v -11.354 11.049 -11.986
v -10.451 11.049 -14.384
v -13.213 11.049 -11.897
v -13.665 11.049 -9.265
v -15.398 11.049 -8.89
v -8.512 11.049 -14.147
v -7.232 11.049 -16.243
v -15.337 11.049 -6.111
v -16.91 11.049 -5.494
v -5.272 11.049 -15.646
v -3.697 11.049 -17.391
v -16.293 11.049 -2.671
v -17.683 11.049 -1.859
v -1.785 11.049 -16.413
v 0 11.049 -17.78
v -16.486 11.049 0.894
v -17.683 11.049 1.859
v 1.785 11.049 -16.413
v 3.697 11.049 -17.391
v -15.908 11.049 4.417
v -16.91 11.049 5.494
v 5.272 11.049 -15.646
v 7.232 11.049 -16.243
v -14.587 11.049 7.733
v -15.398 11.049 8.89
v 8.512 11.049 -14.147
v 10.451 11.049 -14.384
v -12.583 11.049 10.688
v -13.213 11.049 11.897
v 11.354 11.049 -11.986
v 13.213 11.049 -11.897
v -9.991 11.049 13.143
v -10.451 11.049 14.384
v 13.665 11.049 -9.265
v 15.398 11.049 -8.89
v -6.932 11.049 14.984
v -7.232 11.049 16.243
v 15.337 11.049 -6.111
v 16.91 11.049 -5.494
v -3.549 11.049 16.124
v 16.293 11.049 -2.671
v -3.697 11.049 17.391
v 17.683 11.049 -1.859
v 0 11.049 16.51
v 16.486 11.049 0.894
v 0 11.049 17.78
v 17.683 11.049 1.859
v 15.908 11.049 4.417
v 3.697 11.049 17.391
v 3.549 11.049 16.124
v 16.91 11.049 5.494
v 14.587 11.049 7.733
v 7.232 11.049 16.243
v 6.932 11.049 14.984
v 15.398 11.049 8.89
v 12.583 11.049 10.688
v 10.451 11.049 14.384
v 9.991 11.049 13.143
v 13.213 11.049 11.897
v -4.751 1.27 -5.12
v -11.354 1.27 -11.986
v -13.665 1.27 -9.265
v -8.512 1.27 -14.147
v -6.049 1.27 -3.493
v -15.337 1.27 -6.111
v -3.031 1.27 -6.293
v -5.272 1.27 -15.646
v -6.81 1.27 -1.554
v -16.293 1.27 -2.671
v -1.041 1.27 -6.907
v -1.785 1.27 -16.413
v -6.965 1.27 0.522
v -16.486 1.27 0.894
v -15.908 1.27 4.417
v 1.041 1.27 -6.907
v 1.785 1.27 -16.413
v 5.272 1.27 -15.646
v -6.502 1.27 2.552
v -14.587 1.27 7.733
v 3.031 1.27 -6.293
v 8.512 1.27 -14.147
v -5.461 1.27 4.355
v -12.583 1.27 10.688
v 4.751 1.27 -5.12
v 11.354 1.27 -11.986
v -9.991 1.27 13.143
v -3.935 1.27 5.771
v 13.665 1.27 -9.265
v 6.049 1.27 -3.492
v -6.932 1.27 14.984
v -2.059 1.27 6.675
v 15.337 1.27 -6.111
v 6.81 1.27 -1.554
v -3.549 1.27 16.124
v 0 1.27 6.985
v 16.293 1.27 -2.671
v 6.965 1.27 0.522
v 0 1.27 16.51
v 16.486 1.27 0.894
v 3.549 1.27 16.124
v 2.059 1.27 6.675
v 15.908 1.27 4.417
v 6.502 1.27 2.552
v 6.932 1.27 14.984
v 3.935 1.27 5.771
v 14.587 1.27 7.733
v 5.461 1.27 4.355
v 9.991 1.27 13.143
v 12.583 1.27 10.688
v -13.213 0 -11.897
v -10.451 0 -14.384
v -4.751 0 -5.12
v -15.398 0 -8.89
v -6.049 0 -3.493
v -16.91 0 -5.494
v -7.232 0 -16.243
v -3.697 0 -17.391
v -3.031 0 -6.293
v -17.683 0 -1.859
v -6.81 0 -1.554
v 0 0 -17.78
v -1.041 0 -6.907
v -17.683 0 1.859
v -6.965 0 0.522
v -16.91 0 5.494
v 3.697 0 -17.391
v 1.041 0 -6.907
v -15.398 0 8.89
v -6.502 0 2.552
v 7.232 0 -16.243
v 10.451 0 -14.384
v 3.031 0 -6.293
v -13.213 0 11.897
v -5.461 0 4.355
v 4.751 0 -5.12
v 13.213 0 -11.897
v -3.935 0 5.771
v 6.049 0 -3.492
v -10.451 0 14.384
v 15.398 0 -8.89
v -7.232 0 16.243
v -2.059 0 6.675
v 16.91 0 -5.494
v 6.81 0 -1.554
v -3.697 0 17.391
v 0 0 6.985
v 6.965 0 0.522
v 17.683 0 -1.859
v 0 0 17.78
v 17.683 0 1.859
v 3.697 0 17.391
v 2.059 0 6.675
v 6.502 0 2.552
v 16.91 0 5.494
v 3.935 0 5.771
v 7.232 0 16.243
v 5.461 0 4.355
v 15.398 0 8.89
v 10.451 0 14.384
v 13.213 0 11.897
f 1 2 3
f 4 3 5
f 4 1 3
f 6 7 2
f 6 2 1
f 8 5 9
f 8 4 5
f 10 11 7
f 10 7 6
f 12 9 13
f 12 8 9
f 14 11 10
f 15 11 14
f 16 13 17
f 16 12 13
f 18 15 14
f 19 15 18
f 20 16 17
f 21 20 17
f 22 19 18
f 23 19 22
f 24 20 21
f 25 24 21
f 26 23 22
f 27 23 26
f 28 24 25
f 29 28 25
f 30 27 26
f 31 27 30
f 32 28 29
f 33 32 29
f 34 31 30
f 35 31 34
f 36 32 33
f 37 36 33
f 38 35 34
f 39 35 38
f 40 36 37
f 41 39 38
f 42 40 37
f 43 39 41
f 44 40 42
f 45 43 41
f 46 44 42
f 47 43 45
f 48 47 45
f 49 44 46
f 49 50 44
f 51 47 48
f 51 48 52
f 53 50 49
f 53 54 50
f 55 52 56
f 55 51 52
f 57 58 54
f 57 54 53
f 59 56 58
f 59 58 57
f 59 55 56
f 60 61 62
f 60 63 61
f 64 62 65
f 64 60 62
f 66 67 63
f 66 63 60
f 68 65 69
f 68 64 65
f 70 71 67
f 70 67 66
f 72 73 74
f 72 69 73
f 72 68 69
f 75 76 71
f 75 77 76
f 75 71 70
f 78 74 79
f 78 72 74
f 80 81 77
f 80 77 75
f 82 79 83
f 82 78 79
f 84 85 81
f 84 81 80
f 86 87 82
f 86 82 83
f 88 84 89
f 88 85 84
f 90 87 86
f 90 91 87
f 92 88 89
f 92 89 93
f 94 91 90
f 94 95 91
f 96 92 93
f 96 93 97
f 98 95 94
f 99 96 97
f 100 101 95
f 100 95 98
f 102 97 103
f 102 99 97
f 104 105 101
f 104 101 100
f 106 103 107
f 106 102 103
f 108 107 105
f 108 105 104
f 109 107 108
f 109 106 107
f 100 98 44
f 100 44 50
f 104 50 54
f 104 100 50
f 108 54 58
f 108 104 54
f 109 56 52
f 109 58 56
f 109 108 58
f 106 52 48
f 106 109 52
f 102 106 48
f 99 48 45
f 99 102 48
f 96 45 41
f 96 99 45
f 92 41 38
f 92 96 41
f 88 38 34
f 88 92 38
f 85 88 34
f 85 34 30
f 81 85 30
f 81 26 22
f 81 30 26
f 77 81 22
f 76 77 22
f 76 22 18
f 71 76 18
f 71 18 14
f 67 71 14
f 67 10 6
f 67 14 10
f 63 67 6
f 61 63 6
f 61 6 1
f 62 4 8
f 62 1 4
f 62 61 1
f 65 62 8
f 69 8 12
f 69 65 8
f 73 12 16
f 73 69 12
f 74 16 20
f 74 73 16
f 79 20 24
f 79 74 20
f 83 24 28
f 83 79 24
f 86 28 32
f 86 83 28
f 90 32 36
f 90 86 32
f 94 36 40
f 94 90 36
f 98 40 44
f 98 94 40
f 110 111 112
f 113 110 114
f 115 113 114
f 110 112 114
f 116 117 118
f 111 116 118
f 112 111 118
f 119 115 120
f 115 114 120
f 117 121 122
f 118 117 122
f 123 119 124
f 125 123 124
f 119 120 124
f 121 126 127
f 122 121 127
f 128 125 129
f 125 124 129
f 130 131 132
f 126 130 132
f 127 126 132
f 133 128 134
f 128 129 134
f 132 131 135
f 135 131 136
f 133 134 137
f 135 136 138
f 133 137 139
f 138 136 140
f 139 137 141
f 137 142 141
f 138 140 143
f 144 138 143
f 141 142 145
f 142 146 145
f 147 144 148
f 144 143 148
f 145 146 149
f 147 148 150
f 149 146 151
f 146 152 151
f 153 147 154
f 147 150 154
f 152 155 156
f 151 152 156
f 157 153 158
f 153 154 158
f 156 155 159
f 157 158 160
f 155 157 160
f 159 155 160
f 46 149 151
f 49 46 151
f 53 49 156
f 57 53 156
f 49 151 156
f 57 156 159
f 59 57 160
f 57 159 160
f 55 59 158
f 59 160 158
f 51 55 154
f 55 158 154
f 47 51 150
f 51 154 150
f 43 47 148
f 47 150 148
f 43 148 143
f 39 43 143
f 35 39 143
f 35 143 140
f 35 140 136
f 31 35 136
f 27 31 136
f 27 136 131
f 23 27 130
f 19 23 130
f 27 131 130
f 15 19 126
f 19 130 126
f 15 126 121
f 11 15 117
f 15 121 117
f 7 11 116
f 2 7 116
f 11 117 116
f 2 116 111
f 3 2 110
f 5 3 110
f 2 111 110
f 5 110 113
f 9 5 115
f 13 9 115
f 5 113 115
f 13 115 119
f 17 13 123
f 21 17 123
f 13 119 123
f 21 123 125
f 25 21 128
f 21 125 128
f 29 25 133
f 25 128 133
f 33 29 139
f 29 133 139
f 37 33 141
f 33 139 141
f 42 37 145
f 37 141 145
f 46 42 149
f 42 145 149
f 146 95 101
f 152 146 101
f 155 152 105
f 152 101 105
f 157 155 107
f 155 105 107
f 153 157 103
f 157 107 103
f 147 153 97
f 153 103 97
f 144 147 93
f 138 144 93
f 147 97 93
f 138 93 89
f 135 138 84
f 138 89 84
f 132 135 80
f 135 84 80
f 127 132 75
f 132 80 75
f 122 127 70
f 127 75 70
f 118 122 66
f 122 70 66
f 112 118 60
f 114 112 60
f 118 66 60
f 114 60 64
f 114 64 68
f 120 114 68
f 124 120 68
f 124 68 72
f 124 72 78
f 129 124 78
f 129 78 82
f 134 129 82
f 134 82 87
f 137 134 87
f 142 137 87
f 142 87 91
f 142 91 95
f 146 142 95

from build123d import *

# Parameters (mm, degrees)
SKETCH1_R           = 17.78
BOSS_EXTRUDE1_DEPTH = 11.049
SHELL1_T            = -1.27
SKETCH2_R           = 6.985
CUT_EXTRUDE1_DEPTH  = 27.97935583


with BuildPart() as part:
    # Sketch1 → Boss-Extrude1 (new body)
    with BuildSketch(Plane(origin=(0, 0, 0), x_dir=(1, 0, 0), z_dir=(0, 1, 0))):
        with Locations(Location((0, 0, 0), (0, 0, 270))):
            Circle(SKETCH1_R)
    extrude(amount=BOSS_EXTRUDE1_DEPTH)

    # Shell1
    shell1_openings = [part.faces().sort_by_distance(p)[0] for p in [
        (0, 11.049, 0),
    ]]
    offset(amount=SHELL1_T, openings=shell1_openings, kind=Kind.INTERSECTION)

    # Sketch2 → Cut-Extrude1 (cut, through all)
    with BuildSketch(Plane(origin=(0, 1.27, 0), x_dir=(1, 0, 0), z_dir=(0, 1, 0))):
        with Locations(Location((0, 0, 0), (0, 0, 270))):
            Circle(SKETCH2_R)
    extrude(amount=-CUT_EXTRUDE1_DEPTH, mode=Mode.SUBTRACT)


solid = part.part
